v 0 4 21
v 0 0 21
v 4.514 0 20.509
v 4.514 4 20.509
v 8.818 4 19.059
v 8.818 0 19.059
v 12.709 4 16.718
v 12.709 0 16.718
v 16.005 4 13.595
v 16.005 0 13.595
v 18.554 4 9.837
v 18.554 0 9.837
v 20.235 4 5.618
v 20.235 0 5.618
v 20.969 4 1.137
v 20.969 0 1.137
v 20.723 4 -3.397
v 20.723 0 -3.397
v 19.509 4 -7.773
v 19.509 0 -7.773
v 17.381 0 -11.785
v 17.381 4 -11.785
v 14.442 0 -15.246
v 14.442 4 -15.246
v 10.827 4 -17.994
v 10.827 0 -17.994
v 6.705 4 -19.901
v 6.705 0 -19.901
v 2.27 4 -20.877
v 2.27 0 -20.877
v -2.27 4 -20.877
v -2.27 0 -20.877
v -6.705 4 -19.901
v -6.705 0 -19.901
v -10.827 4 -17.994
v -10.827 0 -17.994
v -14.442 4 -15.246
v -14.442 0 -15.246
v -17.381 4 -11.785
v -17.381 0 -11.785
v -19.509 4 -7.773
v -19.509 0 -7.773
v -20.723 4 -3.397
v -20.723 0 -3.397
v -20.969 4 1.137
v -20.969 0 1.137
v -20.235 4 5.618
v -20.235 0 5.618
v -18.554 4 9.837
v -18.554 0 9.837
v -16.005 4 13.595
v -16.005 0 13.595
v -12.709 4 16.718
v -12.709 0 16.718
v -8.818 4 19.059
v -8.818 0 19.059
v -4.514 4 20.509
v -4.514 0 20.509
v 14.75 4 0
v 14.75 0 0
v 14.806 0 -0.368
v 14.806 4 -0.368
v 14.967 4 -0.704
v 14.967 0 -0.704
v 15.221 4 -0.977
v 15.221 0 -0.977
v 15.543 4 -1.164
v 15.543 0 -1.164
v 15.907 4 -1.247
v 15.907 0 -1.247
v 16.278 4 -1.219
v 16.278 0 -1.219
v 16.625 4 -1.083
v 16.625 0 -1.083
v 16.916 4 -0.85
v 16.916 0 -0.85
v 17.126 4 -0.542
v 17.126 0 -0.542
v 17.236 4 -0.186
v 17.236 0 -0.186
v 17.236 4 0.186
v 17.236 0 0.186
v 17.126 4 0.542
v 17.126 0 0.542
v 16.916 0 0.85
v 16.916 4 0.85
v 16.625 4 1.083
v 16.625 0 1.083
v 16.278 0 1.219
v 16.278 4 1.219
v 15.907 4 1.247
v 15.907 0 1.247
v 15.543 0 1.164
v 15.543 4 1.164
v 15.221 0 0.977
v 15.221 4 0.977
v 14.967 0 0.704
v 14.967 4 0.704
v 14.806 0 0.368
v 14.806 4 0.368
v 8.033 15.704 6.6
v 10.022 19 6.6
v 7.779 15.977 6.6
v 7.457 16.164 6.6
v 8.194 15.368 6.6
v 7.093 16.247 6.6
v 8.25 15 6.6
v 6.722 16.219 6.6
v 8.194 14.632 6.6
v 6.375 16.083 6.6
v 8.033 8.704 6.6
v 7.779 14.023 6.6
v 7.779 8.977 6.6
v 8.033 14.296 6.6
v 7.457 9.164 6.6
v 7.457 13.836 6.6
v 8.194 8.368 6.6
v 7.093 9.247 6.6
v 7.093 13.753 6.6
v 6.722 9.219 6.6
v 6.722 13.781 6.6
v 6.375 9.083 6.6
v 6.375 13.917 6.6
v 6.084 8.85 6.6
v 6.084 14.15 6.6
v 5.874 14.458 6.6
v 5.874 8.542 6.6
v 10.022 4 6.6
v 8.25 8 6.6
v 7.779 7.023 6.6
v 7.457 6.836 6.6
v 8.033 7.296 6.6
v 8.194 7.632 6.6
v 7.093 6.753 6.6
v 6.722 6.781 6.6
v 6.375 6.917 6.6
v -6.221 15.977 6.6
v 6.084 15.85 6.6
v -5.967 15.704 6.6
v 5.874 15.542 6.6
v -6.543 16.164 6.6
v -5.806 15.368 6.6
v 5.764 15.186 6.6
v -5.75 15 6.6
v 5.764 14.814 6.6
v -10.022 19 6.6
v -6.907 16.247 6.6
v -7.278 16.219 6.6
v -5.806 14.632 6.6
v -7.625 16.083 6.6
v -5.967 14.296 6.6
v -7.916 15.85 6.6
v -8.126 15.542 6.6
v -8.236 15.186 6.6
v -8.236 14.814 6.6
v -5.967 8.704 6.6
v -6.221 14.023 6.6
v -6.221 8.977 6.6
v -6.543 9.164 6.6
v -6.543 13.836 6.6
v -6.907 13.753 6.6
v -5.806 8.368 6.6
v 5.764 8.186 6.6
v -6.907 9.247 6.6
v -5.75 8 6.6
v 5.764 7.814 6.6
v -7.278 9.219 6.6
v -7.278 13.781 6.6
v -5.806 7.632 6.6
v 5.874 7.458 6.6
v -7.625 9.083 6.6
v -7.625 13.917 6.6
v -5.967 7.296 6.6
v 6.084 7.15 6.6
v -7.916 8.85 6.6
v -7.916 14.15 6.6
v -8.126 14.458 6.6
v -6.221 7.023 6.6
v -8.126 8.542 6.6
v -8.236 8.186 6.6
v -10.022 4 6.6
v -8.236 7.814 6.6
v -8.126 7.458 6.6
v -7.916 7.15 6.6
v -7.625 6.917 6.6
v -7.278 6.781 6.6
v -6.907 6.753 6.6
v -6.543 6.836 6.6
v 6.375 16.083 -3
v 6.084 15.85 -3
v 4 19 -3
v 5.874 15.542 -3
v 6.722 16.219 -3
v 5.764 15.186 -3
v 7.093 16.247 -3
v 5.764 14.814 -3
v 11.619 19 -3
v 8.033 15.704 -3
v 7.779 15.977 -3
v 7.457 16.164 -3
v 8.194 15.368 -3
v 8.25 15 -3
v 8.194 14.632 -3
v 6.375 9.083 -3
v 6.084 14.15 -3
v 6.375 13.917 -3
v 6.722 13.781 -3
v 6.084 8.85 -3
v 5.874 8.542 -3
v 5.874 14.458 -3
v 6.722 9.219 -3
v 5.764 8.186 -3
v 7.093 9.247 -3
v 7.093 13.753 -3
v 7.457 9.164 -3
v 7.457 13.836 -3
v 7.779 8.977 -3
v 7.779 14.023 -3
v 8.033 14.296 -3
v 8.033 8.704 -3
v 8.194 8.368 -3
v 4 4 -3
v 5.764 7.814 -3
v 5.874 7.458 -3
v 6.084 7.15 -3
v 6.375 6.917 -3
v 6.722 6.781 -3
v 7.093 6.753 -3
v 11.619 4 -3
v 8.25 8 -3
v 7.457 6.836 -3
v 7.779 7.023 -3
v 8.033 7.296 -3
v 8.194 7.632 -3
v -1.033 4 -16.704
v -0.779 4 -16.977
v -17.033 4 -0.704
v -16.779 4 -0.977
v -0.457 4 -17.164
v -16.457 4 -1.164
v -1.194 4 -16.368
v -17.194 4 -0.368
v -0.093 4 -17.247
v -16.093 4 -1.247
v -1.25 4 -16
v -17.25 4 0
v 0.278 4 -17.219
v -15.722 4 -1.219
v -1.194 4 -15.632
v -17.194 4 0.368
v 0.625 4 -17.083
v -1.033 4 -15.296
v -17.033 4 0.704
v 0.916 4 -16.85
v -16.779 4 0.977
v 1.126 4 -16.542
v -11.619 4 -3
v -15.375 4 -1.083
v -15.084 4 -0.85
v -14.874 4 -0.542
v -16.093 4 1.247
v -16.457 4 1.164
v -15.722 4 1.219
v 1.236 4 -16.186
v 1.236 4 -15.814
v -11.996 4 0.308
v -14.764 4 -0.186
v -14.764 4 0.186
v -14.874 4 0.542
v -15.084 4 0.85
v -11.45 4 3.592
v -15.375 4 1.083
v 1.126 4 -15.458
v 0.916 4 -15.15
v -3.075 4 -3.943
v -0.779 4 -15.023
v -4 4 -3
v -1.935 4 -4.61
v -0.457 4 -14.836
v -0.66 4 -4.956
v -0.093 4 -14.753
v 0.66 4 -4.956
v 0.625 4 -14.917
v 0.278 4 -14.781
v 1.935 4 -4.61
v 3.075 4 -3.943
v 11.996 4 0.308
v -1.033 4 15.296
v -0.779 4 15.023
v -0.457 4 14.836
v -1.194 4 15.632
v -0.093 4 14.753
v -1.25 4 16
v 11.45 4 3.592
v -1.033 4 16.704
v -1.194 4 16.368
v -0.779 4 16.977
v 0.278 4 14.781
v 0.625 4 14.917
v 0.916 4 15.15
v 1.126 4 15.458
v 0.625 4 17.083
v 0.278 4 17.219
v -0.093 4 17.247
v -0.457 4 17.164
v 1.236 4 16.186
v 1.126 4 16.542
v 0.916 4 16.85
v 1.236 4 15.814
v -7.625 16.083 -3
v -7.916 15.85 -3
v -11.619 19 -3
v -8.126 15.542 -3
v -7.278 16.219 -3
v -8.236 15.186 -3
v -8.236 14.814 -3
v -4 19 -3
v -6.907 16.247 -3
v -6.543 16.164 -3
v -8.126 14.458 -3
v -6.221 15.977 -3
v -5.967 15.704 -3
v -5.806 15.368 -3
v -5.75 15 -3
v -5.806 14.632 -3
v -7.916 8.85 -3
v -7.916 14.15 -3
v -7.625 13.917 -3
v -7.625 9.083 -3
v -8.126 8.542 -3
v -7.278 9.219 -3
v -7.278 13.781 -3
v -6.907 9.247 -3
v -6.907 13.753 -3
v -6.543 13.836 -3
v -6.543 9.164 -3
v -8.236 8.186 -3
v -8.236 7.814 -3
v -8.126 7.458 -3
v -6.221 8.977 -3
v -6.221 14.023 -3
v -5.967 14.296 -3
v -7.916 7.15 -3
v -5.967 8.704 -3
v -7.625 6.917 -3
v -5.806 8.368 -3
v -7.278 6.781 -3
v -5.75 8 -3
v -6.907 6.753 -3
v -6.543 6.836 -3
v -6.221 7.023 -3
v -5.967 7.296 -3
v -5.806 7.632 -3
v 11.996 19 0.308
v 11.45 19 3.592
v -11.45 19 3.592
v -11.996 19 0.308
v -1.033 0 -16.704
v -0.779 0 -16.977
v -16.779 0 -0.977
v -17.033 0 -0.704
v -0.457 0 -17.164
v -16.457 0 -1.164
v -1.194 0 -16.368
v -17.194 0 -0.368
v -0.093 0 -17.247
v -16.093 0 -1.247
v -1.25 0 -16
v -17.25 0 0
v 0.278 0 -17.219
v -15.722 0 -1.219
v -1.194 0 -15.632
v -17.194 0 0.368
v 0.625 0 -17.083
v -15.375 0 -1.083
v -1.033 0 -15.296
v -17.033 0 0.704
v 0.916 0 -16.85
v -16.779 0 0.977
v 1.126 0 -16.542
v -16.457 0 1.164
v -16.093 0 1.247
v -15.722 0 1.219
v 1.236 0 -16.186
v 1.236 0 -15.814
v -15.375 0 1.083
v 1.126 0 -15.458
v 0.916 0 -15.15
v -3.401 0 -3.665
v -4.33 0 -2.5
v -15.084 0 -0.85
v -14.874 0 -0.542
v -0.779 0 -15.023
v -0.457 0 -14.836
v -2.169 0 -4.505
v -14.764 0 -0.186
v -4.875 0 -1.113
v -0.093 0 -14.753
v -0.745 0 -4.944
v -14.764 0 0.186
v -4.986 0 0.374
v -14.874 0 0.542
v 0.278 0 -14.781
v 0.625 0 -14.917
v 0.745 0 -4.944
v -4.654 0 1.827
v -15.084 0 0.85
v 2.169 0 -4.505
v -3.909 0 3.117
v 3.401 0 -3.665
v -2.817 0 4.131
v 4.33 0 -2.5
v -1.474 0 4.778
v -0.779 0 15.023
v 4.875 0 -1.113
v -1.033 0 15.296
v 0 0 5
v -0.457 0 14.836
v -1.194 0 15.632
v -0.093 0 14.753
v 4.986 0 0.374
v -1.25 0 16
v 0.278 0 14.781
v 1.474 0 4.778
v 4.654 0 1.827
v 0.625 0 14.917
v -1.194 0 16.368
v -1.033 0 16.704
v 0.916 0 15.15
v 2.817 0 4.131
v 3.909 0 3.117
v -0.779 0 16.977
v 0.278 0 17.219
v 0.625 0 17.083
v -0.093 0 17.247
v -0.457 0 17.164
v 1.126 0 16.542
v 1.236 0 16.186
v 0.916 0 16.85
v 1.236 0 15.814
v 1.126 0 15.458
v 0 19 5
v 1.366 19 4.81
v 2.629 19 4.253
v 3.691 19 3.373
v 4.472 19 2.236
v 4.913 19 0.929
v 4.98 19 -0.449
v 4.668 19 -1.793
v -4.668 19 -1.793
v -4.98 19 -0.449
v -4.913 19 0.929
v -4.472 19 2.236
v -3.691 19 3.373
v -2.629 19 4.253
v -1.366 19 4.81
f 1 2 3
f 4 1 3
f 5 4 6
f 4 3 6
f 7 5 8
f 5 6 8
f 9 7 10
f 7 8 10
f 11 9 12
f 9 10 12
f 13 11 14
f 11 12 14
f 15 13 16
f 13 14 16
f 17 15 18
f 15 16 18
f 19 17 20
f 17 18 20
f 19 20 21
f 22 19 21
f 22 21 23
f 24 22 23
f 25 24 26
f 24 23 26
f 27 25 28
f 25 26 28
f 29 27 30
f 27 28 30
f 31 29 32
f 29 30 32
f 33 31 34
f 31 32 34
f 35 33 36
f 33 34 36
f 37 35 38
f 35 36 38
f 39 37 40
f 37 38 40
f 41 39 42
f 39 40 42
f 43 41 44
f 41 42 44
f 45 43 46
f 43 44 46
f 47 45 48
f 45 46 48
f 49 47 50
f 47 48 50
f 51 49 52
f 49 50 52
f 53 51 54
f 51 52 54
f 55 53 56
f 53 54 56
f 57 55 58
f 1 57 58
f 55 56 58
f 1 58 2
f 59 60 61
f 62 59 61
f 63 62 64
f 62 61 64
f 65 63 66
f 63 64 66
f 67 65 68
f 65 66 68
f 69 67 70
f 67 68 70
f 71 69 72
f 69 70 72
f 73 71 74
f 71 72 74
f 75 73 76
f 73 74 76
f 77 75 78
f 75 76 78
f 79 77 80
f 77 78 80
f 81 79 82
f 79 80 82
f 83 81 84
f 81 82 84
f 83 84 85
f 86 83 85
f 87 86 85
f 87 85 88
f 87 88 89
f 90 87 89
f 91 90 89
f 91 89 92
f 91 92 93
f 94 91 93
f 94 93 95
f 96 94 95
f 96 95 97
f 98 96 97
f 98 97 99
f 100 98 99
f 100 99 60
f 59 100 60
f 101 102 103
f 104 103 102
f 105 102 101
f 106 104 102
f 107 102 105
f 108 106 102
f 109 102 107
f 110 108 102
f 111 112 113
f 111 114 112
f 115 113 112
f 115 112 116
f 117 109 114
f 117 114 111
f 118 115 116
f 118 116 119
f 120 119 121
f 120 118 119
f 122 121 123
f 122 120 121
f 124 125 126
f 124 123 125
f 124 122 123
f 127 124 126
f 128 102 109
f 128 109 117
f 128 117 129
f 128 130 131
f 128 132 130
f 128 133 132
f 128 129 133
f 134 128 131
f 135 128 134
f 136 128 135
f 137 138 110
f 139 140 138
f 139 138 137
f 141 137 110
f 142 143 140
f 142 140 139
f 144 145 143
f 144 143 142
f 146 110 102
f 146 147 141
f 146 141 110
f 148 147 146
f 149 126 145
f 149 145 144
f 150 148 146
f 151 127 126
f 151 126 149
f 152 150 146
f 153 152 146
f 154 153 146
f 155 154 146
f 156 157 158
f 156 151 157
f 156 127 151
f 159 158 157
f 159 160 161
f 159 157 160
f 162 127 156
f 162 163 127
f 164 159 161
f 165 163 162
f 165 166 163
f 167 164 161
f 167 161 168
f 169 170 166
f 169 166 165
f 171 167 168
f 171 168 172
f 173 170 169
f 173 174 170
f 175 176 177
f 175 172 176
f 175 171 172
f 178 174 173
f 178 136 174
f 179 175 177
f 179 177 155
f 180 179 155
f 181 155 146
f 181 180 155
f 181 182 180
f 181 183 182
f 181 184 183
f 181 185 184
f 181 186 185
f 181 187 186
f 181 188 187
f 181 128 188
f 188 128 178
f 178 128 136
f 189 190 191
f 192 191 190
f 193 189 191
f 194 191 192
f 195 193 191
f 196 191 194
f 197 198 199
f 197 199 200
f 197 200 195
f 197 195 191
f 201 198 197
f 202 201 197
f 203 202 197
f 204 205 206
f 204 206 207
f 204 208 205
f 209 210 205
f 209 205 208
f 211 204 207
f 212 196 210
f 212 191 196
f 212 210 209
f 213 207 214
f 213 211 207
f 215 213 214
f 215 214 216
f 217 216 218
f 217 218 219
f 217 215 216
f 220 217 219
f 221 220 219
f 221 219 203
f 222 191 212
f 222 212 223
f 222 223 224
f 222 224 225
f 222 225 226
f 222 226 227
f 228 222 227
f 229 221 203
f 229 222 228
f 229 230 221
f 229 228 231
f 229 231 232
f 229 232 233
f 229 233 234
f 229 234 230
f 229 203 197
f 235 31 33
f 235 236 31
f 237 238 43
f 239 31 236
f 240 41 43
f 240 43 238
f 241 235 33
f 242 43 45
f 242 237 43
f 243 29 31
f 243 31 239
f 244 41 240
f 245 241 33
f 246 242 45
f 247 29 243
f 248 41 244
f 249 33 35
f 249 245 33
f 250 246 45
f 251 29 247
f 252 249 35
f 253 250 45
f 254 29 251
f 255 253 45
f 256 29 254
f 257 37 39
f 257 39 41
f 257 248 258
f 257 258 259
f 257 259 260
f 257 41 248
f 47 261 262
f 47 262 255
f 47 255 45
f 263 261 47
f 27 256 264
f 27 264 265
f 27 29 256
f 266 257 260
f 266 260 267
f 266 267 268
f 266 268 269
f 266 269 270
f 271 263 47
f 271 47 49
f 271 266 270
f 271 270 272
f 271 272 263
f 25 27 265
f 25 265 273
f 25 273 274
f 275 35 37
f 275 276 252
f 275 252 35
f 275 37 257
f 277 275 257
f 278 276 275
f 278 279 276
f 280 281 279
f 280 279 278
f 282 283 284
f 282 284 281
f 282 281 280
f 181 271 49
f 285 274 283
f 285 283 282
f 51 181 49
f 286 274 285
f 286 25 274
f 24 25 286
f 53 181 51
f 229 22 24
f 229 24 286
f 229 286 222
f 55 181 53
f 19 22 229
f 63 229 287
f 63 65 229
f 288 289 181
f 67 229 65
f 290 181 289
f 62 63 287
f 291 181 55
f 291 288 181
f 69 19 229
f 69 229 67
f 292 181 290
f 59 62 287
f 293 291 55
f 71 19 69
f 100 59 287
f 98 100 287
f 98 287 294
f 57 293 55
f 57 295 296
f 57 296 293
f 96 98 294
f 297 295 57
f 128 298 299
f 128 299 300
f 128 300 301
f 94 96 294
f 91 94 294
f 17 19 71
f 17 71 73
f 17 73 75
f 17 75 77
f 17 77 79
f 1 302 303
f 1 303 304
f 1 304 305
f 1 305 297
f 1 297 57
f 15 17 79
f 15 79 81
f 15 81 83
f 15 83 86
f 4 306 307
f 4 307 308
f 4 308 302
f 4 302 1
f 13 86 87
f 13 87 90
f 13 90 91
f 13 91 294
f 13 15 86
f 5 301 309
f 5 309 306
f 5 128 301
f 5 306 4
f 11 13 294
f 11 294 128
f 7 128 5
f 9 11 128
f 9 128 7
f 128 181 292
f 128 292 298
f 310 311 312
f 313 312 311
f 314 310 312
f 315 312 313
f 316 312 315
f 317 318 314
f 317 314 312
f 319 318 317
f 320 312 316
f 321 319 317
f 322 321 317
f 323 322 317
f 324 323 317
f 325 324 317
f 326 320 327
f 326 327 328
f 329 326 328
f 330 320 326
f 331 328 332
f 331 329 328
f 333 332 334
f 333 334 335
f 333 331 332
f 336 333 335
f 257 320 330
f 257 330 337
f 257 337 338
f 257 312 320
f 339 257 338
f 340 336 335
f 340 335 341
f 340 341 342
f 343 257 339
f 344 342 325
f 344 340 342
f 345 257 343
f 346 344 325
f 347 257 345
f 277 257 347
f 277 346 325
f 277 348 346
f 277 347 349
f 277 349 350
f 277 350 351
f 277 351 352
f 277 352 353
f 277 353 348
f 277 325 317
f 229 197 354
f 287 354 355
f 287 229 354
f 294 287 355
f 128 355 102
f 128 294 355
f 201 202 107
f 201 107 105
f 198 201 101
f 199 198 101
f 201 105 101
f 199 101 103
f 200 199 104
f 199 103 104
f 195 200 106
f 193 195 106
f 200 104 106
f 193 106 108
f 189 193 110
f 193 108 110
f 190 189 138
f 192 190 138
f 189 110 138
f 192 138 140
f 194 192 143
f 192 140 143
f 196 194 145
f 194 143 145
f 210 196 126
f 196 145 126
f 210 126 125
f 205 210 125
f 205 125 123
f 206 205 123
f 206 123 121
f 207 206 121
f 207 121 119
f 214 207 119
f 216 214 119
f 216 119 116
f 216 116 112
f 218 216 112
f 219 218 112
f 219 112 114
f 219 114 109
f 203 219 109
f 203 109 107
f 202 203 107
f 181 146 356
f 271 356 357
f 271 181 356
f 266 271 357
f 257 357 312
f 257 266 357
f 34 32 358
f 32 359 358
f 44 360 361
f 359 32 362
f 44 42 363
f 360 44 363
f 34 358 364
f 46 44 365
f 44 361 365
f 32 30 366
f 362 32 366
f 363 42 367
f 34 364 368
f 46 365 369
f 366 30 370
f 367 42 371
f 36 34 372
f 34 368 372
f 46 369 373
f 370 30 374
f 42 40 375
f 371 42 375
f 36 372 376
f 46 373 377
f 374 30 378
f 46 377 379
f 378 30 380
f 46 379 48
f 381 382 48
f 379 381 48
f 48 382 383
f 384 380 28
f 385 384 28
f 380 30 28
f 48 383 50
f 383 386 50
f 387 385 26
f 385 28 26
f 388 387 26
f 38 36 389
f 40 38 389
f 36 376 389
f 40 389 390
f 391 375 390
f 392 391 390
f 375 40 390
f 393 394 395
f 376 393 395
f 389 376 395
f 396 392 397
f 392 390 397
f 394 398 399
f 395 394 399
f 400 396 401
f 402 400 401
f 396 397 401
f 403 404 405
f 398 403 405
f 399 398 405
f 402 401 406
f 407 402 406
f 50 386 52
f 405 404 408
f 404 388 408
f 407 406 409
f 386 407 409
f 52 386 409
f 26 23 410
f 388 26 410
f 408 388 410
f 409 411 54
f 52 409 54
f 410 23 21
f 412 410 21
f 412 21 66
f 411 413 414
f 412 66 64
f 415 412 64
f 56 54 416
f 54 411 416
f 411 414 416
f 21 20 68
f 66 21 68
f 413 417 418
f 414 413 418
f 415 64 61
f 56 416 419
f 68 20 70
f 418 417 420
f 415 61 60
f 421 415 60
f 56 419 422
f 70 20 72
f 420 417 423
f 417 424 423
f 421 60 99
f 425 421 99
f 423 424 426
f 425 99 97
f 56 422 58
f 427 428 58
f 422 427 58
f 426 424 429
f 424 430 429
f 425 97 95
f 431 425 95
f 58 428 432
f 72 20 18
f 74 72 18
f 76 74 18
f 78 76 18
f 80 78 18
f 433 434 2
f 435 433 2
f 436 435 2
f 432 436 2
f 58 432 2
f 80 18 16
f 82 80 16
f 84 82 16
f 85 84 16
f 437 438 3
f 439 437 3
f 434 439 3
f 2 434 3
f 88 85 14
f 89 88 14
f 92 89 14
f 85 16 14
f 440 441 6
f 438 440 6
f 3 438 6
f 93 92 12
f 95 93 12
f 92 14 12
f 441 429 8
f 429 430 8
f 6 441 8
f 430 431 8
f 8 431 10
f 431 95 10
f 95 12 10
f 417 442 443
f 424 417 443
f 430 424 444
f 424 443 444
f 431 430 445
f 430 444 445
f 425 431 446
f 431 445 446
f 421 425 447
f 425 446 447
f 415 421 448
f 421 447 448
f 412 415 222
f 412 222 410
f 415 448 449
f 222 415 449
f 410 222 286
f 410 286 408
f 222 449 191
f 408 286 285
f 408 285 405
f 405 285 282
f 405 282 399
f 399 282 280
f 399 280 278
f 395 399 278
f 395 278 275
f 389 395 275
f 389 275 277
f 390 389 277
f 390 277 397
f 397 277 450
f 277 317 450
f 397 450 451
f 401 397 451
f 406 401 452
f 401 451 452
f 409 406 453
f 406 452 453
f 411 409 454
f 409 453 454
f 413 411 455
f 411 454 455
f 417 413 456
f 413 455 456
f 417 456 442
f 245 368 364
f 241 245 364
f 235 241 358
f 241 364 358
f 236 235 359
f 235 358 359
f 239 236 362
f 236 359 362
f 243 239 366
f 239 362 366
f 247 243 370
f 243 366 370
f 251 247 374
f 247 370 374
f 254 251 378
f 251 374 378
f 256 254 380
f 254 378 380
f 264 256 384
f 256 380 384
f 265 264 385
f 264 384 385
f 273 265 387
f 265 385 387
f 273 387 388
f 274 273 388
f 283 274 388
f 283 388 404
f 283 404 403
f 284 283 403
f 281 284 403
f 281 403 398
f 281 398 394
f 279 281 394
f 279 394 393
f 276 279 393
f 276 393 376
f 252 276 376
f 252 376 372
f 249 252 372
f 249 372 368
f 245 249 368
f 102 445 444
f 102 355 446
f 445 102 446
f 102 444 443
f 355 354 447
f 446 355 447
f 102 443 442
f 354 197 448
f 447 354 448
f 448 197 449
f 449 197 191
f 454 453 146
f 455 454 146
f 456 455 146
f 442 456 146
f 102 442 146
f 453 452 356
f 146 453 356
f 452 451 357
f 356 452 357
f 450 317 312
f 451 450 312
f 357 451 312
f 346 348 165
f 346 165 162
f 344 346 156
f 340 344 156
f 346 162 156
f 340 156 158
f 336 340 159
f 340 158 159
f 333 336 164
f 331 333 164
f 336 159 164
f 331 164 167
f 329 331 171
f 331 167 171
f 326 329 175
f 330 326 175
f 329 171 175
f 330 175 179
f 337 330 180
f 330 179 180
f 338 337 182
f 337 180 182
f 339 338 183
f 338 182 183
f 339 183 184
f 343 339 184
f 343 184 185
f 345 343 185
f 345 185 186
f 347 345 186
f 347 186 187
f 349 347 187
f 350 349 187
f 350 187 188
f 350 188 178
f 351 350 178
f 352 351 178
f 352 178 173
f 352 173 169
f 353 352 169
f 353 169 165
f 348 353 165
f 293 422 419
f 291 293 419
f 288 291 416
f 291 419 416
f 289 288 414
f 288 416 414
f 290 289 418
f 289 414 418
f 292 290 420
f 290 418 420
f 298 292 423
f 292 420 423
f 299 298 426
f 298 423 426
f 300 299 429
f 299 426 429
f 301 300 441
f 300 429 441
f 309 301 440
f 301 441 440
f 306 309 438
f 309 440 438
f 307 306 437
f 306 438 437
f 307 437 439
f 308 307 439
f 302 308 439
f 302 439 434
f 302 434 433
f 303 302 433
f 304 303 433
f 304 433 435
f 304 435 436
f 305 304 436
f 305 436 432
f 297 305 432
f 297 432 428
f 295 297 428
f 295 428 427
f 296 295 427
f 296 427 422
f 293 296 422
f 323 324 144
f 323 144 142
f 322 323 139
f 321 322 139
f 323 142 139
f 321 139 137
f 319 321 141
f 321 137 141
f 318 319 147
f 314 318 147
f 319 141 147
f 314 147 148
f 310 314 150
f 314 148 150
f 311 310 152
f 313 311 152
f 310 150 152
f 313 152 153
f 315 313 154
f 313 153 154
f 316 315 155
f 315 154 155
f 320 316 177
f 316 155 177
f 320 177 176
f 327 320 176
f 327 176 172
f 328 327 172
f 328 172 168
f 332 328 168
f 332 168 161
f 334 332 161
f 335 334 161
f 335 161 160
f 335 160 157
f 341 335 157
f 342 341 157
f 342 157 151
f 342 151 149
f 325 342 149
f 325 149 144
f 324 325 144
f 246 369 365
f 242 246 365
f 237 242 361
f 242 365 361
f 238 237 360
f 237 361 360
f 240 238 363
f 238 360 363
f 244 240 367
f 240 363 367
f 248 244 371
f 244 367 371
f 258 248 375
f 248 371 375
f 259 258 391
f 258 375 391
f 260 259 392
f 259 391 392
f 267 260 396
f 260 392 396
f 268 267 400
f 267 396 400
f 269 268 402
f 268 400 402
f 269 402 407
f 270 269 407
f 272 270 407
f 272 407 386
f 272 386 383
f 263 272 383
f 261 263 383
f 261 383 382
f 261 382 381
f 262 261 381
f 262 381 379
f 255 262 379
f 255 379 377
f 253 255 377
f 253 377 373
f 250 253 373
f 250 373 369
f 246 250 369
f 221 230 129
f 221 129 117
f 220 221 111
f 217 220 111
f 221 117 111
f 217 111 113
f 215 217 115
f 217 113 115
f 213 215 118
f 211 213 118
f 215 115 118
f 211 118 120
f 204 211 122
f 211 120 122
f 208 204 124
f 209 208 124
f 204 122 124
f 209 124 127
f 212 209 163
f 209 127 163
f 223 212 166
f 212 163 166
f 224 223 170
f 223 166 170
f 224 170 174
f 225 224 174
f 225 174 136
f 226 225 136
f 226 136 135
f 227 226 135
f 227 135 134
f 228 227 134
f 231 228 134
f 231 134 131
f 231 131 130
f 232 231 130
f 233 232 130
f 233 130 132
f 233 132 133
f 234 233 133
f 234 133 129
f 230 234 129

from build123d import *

# Parameters (mm, degrees)
SKETCH_1_R          = 21
EXTRUDE_1_DEPTH     = 4
HOLE_WIZARD_M3_1_D  = 2.5
EXTRUDE_2_DEPTH     = 15
SKETCH_5_R          = 5
CUT_EXTRUDE_1_DEPTH = 36.256205128
HOLE_WIZARD_M3_2_D  = 2.5


with BuildPart() as part:
    # 草图1 → 凸台-拉伸1 (new body)
    with BuildSketch(Plane(origin=(0, 0, 0), x_dir=(1, 0, 0), z_dir=(0, 1, 0))):
        with Locations(Location((0, 0, 0), (0, 0, 270))):
            Circle(SKETCH_1_R)
    extrude(amount=EXTRUDE_1_DEPTH)

    # M3 螺纹孔1 (through all)
    with Locations(Plane(origin=(0, 4, 0), x_dir=(1, 0, 0), z_dir=(0, 1, 0))):
        with Locations((0, 16), (16, 0), (0, -16), (-16, 0)):
            Hole(HOLE_WIZARD_M3_1_D / 2)

    # 草图2 → 凸台-拉伸2 (add)
    with BuildSketch(Plane(origin=(0, 4, 0), x_dir=(1, 0, 0), z_dir=(0, 1, 0))):
        with BuildLine():
            Line((-11.618950039, 3), (11.618950039, 3))
            ThreePointArc((11.618950039, 3), (11.837331556, -1.969157596), (10.021975853, -6.6))
            Line((10.021975853, -6.6), (-10.021975853, -6.6))
            ThreePointArc((-10.021975853, -6.6), (-11.837331556, -1.969157596), (-11.618950039, 3))
        make_face()
    extrude(amount=EXTRUDE_2_DEPTH)

    # 草图5 → 切除-拉伸1 (cut, through all)
    with BuildSketch(Plane(origin=(0, 19, 0), x_dir=(1, 0, 0), z_dir=(0, 1, 0))):
        with Locations(Location((0, 0, 0), (0, 0, 270))):
            Circle(SKETCH_5_R)
    extrude(amount=-CUT_EXTRUDE_1_DEPTH, mode=Mode.SUBTRACT)

    # M3 螺纹孔2 (through all)
    with Locations(Plane(origin=(0, 0, -3), x_dir=(-1, 0, 0), z_dir=(0, 0, -1))):
        with Locations((7, 8), (7, 15), (-7, 8), (-7, 15)):
            Hole(HOLE_WIZARD_M3_2_D / 2)


solid = part.part
